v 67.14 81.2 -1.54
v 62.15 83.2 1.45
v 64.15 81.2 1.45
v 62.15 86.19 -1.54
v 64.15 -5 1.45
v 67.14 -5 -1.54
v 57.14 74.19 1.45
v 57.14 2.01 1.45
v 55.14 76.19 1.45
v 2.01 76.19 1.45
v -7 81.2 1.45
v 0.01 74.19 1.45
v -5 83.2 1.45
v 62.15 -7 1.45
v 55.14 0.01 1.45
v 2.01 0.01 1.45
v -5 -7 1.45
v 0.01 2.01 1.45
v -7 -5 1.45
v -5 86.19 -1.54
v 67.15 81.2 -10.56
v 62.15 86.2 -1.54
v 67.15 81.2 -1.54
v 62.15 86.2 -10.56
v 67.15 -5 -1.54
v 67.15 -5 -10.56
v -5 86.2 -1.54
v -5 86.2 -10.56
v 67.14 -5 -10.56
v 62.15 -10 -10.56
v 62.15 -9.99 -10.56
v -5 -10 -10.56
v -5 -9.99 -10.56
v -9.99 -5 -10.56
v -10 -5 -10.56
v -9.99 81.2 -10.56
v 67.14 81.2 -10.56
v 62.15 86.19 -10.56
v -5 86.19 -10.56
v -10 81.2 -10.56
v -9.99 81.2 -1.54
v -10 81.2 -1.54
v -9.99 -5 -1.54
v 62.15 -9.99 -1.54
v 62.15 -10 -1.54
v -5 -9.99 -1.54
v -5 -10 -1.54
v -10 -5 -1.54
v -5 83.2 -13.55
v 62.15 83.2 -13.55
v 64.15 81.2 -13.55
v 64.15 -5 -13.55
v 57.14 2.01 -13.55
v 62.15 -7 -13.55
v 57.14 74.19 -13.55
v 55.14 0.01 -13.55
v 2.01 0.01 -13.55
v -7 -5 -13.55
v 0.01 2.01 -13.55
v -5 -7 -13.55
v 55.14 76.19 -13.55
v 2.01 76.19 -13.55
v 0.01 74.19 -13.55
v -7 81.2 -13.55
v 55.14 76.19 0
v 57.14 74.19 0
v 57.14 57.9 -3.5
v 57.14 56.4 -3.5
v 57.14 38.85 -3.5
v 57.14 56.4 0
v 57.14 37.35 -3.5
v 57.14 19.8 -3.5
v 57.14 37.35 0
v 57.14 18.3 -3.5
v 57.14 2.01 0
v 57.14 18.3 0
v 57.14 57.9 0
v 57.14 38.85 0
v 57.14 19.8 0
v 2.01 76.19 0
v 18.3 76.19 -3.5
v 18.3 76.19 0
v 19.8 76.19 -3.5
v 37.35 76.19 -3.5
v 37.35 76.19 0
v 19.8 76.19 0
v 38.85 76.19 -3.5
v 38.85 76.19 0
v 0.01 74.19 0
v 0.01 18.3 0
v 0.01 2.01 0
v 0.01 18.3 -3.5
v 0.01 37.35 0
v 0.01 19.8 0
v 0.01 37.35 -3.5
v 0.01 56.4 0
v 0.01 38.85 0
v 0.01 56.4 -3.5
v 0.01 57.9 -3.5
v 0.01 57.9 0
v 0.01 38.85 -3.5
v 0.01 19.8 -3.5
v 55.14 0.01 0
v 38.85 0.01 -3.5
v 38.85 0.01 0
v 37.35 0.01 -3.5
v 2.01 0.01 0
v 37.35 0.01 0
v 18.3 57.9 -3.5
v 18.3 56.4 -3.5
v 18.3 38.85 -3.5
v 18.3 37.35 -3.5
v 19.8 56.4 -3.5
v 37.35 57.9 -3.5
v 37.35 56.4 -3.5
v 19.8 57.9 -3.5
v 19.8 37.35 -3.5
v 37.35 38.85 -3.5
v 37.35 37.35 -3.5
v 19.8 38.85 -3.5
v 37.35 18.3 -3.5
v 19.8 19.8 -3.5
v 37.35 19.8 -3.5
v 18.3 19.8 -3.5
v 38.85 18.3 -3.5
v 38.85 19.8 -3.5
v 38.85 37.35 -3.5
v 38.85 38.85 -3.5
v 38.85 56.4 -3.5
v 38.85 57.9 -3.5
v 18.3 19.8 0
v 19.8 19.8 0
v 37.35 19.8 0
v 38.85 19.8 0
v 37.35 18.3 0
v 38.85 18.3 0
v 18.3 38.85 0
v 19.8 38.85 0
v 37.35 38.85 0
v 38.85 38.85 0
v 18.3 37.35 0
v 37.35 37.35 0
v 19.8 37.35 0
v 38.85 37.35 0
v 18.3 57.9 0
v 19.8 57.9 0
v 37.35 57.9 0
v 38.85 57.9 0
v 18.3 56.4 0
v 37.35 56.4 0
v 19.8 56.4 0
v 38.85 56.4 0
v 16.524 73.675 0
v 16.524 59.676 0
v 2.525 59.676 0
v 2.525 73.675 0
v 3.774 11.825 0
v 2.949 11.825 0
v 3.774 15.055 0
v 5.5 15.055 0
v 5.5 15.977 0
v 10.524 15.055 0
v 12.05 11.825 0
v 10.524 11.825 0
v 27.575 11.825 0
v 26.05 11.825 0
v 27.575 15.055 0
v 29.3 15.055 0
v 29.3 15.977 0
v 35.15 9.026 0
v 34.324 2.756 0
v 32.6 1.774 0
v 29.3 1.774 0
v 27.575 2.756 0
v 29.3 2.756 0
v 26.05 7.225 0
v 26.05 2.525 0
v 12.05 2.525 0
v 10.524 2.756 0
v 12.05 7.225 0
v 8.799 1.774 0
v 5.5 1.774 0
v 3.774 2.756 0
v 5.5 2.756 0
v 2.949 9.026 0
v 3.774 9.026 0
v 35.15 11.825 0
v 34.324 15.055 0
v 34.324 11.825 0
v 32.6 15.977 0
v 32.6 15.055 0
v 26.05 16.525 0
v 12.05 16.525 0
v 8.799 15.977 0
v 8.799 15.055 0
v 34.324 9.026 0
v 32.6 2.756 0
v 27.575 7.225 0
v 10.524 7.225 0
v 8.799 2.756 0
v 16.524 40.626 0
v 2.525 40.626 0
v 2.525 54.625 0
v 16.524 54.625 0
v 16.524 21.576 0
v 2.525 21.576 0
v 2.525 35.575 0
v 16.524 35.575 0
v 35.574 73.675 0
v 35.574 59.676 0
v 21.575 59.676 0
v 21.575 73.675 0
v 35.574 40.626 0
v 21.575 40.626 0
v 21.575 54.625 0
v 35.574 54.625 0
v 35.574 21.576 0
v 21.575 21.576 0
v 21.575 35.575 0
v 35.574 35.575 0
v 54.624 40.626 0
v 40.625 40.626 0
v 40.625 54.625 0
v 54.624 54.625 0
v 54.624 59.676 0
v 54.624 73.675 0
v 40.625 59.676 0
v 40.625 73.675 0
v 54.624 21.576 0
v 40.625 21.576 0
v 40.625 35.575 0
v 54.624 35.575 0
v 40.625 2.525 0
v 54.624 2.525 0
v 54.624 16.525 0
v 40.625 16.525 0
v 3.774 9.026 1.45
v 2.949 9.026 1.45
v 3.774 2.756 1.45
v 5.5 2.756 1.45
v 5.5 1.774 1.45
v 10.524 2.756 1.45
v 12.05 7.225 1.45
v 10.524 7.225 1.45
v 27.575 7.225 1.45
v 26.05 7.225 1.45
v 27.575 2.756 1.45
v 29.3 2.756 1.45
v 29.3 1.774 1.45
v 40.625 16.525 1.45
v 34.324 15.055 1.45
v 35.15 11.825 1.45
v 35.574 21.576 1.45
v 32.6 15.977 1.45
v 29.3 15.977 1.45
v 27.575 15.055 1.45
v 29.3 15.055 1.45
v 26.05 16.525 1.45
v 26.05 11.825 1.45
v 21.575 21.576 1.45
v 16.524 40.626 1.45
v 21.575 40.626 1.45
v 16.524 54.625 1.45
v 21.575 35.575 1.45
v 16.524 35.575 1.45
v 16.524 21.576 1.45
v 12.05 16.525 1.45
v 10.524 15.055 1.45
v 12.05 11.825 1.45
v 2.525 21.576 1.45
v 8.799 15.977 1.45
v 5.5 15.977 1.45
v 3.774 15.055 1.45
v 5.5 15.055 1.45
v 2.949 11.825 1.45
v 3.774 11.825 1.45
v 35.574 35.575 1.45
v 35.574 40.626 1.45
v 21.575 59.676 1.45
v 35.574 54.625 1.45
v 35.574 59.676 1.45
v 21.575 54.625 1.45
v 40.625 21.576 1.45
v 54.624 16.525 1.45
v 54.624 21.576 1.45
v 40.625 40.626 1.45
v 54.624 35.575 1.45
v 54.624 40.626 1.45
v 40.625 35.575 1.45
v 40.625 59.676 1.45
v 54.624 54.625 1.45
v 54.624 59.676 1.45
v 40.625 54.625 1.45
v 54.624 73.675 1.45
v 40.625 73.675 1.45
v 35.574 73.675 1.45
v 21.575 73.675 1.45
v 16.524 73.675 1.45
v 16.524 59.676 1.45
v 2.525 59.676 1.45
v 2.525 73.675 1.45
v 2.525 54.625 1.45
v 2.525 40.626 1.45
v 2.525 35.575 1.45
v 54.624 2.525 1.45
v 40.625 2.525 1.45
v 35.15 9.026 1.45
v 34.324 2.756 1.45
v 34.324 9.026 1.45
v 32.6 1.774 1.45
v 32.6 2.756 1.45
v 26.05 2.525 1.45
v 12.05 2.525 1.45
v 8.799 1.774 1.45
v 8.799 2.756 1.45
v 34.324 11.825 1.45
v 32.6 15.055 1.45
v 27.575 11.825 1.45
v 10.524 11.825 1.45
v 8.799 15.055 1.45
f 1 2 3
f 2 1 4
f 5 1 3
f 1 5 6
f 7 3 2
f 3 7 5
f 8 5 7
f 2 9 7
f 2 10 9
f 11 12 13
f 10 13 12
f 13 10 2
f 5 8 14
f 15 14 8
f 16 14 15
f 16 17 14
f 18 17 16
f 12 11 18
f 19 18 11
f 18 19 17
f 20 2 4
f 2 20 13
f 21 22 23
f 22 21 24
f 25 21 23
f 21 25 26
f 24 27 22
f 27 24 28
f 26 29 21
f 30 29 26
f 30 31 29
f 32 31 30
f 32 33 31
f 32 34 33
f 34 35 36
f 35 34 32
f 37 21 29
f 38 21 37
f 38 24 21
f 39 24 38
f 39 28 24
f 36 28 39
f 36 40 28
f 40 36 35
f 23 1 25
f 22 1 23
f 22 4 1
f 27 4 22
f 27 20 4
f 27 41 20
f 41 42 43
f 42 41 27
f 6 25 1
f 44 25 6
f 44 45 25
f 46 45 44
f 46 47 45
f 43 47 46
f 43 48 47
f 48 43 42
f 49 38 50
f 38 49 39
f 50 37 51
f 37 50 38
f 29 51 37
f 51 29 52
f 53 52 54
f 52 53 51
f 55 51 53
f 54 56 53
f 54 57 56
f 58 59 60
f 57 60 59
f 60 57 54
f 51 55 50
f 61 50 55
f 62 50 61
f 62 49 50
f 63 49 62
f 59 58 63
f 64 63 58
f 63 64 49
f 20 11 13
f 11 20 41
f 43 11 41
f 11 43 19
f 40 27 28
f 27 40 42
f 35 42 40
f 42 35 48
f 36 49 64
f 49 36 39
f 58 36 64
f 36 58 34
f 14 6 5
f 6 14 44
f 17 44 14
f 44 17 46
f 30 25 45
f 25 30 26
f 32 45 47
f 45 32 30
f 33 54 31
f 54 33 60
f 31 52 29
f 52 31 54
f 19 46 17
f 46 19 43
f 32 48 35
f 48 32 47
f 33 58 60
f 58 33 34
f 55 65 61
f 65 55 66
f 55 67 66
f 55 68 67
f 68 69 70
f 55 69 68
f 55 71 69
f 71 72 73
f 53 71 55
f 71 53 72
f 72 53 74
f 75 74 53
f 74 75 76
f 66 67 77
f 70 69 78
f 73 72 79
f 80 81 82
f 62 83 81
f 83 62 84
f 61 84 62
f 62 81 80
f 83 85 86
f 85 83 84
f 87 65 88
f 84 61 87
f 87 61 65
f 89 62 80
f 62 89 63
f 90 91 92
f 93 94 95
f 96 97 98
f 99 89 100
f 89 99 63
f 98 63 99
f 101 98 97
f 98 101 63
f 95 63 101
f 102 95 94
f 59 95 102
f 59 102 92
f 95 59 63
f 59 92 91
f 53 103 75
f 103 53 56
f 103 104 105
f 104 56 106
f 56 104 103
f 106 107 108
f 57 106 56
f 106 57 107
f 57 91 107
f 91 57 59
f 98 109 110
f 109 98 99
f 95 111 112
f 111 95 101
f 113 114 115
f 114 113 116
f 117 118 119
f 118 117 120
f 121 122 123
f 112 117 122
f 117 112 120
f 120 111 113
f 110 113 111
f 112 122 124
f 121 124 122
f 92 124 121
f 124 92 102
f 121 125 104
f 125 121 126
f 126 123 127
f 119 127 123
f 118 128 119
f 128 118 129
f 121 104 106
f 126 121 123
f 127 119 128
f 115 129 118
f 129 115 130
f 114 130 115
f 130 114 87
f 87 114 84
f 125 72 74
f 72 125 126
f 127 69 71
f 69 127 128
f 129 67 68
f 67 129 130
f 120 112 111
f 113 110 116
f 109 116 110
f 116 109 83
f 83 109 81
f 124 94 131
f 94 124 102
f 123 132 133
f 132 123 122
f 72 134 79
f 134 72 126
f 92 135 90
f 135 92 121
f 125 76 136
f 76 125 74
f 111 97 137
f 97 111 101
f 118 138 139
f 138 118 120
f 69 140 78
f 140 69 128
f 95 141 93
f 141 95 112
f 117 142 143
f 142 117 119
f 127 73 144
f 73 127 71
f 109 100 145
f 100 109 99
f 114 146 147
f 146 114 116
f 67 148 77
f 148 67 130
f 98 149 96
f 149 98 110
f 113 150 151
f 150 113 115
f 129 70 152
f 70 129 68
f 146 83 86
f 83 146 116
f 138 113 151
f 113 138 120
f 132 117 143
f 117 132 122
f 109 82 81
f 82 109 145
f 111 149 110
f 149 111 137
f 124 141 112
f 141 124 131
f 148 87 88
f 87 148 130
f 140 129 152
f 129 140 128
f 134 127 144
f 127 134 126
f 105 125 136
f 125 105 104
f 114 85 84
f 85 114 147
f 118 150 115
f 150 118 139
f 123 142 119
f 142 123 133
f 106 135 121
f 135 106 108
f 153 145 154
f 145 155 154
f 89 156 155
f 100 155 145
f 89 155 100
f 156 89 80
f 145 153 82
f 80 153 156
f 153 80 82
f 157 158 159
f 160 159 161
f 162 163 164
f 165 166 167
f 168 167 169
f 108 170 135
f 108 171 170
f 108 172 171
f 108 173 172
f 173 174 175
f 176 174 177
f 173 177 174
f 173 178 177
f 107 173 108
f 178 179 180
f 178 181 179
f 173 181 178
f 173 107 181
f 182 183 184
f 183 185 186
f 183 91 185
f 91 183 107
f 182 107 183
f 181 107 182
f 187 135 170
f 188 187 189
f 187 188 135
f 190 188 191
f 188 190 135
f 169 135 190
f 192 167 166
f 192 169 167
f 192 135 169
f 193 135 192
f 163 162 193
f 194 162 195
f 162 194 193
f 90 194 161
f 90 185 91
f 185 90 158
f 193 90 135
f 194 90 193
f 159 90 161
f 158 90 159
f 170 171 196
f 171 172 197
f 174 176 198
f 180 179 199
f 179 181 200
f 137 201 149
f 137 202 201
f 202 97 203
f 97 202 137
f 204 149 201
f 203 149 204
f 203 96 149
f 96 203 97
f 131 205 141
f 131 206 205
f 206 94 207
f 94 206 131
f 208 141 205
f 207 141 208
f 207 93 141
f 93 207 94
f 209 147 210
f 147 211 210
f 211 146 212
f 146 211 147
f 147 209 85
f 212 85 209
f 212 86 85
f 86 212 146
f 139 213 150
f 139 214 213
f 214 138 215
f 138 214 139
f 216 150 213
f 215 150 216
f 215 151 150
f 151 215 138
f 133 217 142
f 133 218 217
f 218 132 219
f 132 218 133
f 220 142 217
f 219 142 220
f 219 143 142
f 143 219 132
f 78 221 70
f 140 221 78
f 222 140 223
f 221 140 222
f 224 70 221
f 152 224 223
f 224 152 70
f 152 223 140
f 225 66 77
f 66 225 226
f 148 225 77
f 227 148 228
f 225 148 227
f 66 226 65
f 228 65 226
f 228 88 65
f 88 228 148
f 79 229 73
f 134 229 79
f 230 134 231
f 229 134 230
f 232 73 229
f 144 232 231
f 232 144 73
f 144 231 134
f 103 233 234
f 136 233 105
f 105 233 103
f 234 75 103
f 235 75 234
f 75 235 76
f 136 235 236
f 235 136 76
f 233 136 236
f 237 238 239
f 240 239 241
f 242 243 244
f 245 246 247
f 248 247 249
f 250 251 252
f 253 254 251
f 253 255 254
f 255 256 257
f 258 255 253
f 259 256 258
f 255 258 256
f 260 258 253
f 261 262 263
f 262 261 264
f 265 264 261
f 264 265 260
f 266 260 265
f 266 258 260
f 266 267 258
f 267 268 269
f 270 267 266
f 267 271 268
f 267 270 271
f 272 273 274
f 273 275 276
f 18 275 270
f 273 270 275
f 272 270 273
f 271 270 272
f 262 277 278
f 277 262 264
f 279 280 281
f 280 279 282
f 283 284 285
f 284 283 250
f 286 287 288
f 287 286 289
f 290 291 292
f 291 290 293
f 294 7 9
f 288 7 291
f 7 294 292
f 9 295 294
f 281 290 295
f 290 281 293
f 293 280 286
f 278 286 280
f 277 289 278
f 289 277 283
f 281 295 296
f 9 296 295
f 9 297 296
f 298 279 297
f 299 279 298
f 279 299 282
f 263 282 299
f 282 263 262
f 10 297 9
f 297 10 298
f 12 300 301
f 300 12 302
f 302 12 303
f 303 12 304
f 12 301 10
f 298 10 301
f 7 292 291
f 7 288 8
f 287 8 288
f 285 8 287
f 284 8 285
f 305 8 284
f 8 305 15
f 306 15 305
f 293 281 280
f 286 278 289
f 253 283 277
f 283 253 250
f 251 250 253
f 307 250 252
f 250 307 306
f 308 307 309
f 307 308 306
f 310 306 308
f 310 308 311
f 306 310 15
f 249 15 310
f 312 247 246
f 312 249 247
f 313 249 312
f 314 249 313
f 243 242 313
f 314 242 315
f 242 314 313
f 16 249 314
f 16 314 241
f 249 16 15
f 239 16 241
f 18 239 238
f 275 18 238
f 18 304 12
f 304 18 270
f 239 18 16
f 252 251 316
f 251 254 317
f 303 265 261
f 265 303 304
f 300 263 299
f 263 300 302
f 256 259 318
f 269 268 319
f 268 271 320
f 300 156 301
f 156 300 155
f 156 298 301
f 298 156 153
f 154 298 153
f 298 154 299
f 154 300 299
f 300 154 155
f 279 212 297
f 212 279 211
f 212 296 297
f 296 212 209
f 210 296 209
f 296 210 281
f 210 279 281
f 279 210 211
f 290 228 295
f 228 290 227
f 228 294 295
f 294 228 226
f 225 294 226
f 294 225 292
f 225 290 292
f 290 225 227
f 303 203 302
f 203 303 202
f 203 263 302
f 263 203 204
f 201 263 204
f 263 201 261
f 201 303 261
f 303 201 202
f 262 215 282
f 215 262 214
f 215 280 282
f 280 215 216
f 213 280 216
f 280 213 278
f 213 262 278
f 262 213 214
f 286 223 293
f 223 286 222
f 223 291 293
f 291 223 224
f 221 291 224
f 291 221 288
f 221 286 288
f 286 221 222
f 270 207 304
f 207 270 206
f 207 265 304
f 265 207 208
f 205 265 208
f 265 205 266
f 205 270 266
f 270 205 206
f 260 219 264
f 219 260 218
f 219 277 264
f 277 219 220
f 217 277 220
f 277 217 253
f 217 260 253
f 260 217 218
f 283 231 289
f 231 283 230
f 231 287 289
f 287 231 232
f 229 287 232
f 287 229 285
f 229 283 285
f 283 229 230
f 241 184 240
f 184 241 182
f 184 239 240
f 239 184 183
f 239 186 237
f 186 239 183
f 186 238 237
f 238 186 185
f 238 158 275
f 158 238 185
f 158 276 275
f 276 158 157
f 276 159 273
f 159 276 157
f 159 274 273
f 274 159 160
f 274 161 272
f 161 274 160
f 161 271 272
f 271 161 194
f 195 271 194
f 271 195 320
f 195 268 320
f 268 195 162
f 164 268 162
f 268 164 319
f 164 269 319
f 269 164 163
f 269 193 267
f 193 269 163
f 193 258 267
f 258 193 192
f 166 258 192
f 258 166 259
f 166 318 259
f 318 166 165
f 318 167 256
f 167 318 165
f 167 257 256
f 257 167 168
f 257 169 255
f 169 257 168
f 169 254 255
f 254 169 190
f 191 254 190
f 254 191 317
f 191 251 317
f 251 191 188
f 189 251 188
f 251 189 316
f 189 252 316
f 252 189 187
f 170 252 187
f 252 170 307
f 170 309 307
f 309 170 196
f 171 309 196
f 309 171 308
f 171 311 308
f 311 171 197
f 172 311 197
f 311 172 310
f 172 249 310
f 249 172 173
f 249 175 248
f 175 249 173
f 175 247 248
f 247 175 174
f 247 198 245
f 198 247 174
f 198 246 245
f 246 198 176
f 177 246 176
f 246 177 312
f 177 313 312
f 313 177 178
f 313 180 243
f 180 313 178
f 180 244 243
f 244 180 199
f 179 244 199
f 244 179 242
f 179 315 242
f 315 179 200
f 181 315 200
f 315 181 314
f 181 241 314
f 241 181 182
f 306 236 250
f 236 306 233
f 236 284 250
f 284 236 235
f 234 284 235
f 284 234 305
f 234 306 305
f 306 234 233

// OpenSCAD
// file: scad/beveled_cube.scad
// Beveled cube
//
// dim: dimensions of the cube
// bevel_top: 2d array width the dimensions of the bevel used
//   at the top of the cube. The first element specifies the 
//   amount the bevel goed towards the z-axis. The second
//   element the height of the bevel.
// bevel_size: single value with the dimension of the side 
//   bevel
// bevel_bottom: 2d array for the bottom bevel. See 
//   bevel_top. 
//
// The cube is centered at the origin for the x and y axis and 
// the bottom of the cube is positioned at z=0. 
// 
// Example:
 dim = [200, 100, 20];
 bevel_top  = [10, 3];
 bevel_side  = 8;
 bevel_bottom  = [4, 4];
 beveled_cube(dim, bevel_top, bevel_side, bevel_bottom);

module beveled_cube(dim, bevel_top, bevel_side, bevel_bottom) {
  mar = 0.01;
  d = [dim[0]*0.5+mar, dim[1]*0.5+mar, dim[2]];
  translate([-mar, -mar, 0])
    beveled_cube_q(d, bevel_top, bevel_side, bevel_bottom);
  mirror([1, 0, 0])
    translate([-mar, -mar, 0])
    beveled_cube_q(d, bevel_top, bevel_side, bevel_bottom);
  mirror([0, 1, 0])
    translate([-mar, -mar, 0])
    beveled_cube_q(d, bevel_top, bevel_side, bevel_bottom);
  mirror([1, 0, 0]) mirror([0, 1, 0])
    translate([-mar, -mar, 0])
    beveled_cube_q(d, bevel_top, bevel_side, bevel_bottom);
}

// Utility function for beveled_cube
module beveled_cube_q(dim, bt, bs, bb) {
  mar = 0.01;
  // top
  translate([0, 0, dim[2]-bt[1]])
    bevels([dim[0], dim[1], bt[1]], bt[0], bs);
  // middle
  translate([0, 0, bb[1]-mar])
    bevels([dim[0], dim[1], dim[2]-bt[1]-bb[1]+2*mar], 0, bs);
  //bottom
  translate([0, 0, bb[1]])
    mirror([0, 0, 1])
    bevels([dim[0], dim[1], bb[1]], bb[0], bs);
}

// Utility function for beveled_cube
module bevels(dim, bt, bs) {
  polyhedron(
    points = [
      [0, 0, 0], // 0
      [dim[0], 0, 0], // 1
      [dim[0]-bt, 0, dim[2]], // 2
      [0, 0, dim[2]],  // 3
      [dim[0], dim[1]-bs, 0], //4 
      [dim[0]-bt, min(dim[1]-bt, dim[1]-bs), dim[2]], //5
      [0, dim[1], 0],  // 6
      [dim[0]-bs, dim[1], 0], //7 
      [min(dim[0]-bt, dim[0]-bs), dim[1]-bt, dim[2]], //8
      [0, dim[1]-bt, dim[2]] //9
    ],
    faces = [
      [3, 9, 8, 5, 2], //top
      [0, 3, 2, 1], //front
      [0, 6, 9, 3], //left 
      [6, 7, 8, 9], // back
      [7, 4, 5, 8], // back-side-bevel
      [1, 2, 5, 4], // right side
      [0, 1, 4, 7, 6] // bottom
    ]
  );
}
// main file
$fn=100;
mar = 0.01;

// == Parameters of plate
plate_grid        = 19.05;
plate_thickness   = 1.45;
plate_nwidth      = 3;
plate_nlength     = 4;
plate_width       = plate_grid*plate_nwidth;
plate_length      = plate_grid*plate_nlength;

// == Parameters for switches
// https://switches-sensors.zf.com/wp-content/uploads/2012/07/Keymodule_MX_EN.pdf
switch_depth      = 5;
switch_pinlength  = 3.3;
switch_stick_out  = switch_depth+switch_pinlength - plate_thickness;

// == Parameters of outer case
case_pad          = 2*10;
case_width        = plate_width + case_pad;
case_length       = plate_length + case_pad;
case_height       = 15;
case_bevel_top    = 3;
case_bevel_corner = 5;
case_bevel_bottom = 3;
case_bevel_inner  = 2;

// Parameters for raster
raster_height     = 5-1.5;
raster_width      = 1.5;
raster_skip       = 1;


//cross_height = 5+3.3-1.5+1;
//cross_width = 1.5;



//wall = 2;
//rwall = 4;
//hwall = 5+3.3+1.5+6;



use<scad/beveled_cube.scad>


// how far does switch stick out at the back of the plate:
// https://switches-sensors.zf.com/wp-content/uploads/2012/07/Keymodule_MX_EN.pdf
// 5 mm thickness swith
// 3.3 mm length pins
// -1.5 thickness plate
// 5 + 3.3 - 1.5


// === TOP PLATE
color("red")
linear_extrude(plate_thickness)
  translate([-0.0947, -0.2578])
  import("sources/plate_base.dxf", convexity = 10);
  
// === CASE
translate([(plate_width)/2, plate_length/2, -case_height+plate_thickness])
difference() {
  // outside of case
  beveled_cube([case_width, case_length, case_height], 
      [case_bevel_top,case_bevel_top], case_bevel_corner, 
      [case_bevel_bottom, case_bevel_bottom]);
  // cut out central cube (where the plate is)
  translate([0, 0, -1])
    beveled_cube([plate_width-2*mar, plate_length-2*mar, case_height+2],
      [0.1, 0.1], case_bevel_inner, [0.1,0.1]);  
  // TODO cutout for bottom
  // TODO cutout for USB-port and controler
}

// === RASTER
// Raster in x/width direction
for (i = [1:(plate_nlength-1)]) {
  translate([-mar, i*plate_grid-raster_width/2, -raster_height])
    cube([plate_width+2*mar, raster_width, raster_height+mar]);
}
// Raster in y/length direction
for (i = [1:(plate_nwidth-1)]) {
  if (i == raster_skip) {
    translate([i*plate_grid-raster_width/2, -mar+plate_grid, -raster_height])
      cube([raster_width, plate_length+2*mar-plate_grid, raster_height+mar]);
  } else {
    translate([i*plate_grid-raster_width/2, -mar, -raster_height])
      cube([raster_width, plate_length+2*mar, raster_height+mar]);
  }
}
